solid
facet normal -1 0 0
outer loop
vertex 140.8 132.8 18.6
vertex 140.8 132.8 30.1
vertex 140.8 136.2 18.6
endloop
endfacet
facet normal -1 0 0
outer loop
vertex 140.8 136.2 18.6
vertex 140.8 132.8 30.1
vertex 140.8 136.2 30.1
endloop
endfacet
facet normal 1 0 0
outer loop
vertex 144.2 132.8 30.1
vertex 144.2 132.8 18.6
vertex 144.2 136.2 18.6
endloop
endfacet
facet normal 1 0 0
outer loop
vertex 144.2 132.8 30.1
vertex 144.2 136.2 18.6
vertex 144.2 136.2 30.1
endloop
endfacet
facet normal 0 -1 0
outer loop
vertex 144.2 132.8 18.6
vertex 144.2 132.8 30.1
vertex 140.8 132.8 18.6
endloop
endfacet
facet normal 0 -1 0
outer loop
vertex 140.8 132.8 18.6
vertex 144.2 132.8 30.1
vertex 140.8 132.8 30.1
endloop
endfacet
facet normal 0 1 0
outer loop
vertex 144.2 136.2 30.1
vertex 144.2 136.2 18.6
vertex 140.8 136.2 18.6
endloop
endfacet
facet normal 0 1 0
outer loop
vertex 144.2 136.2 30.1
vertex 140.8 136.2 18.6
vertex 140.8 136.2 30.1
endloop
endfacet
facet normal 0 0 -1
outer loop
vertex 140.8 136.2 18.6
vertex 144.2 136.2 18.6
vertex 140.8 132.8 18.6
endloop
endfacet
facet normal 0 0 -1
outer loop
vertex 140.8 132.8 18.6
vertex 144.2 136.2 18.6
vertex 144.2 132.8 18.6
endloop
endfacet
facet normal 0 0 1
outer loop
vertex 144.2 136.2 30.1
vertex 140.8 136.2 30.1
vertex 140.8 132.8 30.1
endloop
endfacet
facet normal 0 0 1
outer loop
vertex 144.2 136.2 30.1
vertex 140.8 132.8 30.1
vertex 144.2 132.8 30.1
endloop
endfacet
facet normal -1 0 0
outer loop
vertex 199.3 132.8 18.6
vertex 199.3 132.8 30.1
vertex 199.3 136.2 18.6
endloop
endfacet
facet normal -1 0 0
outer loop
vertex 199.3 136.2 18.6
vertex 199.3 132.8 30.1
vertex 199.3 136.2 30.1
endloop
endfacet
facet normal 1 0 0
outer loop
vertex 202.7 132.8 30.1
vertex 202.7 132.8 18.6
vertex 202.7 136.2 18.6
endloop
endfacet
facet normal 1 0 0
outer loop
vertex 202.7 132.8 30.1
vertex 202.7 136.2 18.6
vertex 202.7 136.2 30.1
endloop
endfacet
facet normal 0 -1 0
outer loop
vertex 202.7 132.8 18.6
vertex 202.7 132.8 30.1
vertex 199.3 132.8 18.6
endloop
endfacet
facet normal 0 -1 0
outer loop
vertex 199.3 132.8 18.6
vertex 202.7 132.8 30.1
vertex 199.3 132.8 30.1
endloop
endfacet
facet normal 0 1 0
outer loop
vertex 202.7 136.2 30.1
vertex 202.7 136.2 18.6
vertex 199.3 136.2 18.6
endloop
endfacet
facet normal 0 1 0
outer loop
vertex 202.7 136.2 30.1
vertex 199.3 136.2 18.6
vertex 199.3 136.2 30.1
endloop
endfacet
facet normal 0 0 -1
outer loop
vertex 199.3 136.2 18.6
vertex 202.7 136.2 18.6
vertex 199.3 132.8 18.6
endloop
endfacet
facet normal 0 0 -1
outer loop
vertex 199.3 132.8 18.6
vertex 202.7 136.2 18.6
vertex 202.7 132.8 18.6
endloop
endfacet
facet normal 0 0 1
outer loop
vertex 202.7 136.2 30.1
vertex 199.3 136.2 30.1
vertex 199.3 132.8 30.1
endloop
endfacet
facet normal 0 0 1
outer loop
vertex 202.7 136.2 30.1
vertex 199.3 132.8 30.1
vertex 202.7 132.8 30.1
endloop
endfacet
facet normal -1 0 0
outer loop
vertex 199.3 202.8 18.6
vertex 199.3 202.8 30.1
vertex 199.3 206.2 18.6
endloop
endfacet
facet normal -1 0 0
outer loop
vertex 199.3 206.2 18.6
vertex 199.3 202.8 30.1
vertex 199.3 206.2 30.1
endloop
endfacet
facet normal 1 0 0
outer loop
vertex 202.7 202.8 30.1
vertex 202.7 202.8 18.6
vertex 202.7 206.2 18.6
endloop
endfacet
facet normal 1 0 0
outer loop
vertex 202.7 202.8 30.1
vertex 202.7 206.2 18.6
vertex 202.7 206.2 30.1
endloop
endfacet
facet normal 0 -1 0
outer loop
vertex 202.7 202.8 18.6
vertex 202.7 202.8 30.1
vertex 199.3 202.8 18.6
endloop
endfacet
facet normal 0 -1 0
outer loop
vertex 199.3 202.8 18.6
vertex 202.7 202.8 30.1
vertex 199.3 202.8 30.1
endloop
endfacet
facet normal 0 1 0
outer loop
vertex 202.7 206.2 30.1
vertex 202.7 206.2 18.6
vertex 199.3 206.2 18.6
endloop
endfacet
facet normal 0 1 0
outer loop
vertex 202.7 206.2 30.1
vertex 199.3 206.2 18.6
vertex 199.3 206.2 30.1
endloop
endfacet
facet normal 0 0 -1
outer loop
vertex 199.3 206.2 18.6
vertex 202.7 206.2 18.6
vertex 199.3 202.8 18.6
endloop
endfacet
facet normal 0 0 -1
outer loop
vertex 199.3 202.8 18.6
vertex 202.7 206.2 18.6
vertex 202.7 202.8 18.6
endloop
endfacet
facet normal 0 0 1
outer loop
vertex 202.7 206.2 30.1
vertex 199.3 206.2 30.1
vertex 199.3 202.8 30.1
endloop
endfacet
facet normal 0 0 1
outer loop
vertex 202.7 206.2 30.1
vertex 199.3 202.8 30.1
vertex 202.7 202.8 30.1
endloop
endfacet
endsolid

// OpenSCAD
// Generated by the canonical parent Python sources and validated exchange pipeline.
polyhedron(points=[[140.8000030517578, 132.8000030517578, 18.600000381469727], [140.8000030517578, 132.8000030517578, 30.100000381469727], [140.8000030517578, 136.1999969482422, 18.600000381469727], [140.8000030517578, 136.1999969482422, 30.100000381469727], [144.1999969482422, 132.8000030517578, 30.100000381469727], [144.1999969482422, 132.8000030517578, 18.600000381469727], [144.1999969482422, 136.1999969482422, 18.600000381469727], [144.1999969482422, 136.1999969482422, 30.100000381469727], [199.3000030517578, 132.8000030517578, 18.600000381469727], [199.3000030517578, 132.8000030517578, 30.100000381469727], [199.3000030517578, 136.1999969482422, 18.600000381469727], [199.3000030517578, 136.1999969482422, 30.100000381469727], [202.6999969482422, 132.8000030517578, 30.100000381469727], [202.6999969482422, 132.8000030517578, 18.600000381469727], [202.6999969482422, 136.1999969482422, 18.600000381469727], [202.6999969482422, 136.1999969482422, 30.100000381469727], [199.3000030517578, 202.8000030517578, 18.600000381469727], [199.3000030517578, 202.8000030517578, 30.100000381469727], [199.3000030517578, 206.1999969482422, 18.600000381469727], [199.3000030517578, 206.1999969482422, 30.100000381469727], [202.6999969482422, 202.8000030517578, 30.100000381469727], [202.6999969482422, 202.8000030517578, 18.600000381469727], [202.6999969482422, 206.1999969482422, 18.600000381469727], [202.6999969482422, 206.1999969482422, 30.100000381469727]],faces=[[2, 1, 0], [3, 1, 2], [6, 5, 4], [7, 6, 4], [0, 4, 5], [1, 4, 0], [2, 6, 7], [3, 2, 7], [0, 6, 2], [5, 6, 0], [1, 3, 7], [4, 1, 7], [10, 9, 8], [11, 9, 10], [14, 13, 12], [15, 14, 12], [8, 12, 13], [9, 12, 8], [10, 14, 15], [11, 10, 15], [8, 14, 10], [13, 14, 8], [9, 11, 15], [12, 9, 15], [18, 17, 16], [19, 17, 18], [22, 21, 20], [23, 22, 20], [16, 20, 21], [17, 20, 16], [18, 22, 23], [19, 18, 23], [16, 22, 18], [21, 22, 16], [17, 19, 23], [20, 17, 23]],convexity=10);
